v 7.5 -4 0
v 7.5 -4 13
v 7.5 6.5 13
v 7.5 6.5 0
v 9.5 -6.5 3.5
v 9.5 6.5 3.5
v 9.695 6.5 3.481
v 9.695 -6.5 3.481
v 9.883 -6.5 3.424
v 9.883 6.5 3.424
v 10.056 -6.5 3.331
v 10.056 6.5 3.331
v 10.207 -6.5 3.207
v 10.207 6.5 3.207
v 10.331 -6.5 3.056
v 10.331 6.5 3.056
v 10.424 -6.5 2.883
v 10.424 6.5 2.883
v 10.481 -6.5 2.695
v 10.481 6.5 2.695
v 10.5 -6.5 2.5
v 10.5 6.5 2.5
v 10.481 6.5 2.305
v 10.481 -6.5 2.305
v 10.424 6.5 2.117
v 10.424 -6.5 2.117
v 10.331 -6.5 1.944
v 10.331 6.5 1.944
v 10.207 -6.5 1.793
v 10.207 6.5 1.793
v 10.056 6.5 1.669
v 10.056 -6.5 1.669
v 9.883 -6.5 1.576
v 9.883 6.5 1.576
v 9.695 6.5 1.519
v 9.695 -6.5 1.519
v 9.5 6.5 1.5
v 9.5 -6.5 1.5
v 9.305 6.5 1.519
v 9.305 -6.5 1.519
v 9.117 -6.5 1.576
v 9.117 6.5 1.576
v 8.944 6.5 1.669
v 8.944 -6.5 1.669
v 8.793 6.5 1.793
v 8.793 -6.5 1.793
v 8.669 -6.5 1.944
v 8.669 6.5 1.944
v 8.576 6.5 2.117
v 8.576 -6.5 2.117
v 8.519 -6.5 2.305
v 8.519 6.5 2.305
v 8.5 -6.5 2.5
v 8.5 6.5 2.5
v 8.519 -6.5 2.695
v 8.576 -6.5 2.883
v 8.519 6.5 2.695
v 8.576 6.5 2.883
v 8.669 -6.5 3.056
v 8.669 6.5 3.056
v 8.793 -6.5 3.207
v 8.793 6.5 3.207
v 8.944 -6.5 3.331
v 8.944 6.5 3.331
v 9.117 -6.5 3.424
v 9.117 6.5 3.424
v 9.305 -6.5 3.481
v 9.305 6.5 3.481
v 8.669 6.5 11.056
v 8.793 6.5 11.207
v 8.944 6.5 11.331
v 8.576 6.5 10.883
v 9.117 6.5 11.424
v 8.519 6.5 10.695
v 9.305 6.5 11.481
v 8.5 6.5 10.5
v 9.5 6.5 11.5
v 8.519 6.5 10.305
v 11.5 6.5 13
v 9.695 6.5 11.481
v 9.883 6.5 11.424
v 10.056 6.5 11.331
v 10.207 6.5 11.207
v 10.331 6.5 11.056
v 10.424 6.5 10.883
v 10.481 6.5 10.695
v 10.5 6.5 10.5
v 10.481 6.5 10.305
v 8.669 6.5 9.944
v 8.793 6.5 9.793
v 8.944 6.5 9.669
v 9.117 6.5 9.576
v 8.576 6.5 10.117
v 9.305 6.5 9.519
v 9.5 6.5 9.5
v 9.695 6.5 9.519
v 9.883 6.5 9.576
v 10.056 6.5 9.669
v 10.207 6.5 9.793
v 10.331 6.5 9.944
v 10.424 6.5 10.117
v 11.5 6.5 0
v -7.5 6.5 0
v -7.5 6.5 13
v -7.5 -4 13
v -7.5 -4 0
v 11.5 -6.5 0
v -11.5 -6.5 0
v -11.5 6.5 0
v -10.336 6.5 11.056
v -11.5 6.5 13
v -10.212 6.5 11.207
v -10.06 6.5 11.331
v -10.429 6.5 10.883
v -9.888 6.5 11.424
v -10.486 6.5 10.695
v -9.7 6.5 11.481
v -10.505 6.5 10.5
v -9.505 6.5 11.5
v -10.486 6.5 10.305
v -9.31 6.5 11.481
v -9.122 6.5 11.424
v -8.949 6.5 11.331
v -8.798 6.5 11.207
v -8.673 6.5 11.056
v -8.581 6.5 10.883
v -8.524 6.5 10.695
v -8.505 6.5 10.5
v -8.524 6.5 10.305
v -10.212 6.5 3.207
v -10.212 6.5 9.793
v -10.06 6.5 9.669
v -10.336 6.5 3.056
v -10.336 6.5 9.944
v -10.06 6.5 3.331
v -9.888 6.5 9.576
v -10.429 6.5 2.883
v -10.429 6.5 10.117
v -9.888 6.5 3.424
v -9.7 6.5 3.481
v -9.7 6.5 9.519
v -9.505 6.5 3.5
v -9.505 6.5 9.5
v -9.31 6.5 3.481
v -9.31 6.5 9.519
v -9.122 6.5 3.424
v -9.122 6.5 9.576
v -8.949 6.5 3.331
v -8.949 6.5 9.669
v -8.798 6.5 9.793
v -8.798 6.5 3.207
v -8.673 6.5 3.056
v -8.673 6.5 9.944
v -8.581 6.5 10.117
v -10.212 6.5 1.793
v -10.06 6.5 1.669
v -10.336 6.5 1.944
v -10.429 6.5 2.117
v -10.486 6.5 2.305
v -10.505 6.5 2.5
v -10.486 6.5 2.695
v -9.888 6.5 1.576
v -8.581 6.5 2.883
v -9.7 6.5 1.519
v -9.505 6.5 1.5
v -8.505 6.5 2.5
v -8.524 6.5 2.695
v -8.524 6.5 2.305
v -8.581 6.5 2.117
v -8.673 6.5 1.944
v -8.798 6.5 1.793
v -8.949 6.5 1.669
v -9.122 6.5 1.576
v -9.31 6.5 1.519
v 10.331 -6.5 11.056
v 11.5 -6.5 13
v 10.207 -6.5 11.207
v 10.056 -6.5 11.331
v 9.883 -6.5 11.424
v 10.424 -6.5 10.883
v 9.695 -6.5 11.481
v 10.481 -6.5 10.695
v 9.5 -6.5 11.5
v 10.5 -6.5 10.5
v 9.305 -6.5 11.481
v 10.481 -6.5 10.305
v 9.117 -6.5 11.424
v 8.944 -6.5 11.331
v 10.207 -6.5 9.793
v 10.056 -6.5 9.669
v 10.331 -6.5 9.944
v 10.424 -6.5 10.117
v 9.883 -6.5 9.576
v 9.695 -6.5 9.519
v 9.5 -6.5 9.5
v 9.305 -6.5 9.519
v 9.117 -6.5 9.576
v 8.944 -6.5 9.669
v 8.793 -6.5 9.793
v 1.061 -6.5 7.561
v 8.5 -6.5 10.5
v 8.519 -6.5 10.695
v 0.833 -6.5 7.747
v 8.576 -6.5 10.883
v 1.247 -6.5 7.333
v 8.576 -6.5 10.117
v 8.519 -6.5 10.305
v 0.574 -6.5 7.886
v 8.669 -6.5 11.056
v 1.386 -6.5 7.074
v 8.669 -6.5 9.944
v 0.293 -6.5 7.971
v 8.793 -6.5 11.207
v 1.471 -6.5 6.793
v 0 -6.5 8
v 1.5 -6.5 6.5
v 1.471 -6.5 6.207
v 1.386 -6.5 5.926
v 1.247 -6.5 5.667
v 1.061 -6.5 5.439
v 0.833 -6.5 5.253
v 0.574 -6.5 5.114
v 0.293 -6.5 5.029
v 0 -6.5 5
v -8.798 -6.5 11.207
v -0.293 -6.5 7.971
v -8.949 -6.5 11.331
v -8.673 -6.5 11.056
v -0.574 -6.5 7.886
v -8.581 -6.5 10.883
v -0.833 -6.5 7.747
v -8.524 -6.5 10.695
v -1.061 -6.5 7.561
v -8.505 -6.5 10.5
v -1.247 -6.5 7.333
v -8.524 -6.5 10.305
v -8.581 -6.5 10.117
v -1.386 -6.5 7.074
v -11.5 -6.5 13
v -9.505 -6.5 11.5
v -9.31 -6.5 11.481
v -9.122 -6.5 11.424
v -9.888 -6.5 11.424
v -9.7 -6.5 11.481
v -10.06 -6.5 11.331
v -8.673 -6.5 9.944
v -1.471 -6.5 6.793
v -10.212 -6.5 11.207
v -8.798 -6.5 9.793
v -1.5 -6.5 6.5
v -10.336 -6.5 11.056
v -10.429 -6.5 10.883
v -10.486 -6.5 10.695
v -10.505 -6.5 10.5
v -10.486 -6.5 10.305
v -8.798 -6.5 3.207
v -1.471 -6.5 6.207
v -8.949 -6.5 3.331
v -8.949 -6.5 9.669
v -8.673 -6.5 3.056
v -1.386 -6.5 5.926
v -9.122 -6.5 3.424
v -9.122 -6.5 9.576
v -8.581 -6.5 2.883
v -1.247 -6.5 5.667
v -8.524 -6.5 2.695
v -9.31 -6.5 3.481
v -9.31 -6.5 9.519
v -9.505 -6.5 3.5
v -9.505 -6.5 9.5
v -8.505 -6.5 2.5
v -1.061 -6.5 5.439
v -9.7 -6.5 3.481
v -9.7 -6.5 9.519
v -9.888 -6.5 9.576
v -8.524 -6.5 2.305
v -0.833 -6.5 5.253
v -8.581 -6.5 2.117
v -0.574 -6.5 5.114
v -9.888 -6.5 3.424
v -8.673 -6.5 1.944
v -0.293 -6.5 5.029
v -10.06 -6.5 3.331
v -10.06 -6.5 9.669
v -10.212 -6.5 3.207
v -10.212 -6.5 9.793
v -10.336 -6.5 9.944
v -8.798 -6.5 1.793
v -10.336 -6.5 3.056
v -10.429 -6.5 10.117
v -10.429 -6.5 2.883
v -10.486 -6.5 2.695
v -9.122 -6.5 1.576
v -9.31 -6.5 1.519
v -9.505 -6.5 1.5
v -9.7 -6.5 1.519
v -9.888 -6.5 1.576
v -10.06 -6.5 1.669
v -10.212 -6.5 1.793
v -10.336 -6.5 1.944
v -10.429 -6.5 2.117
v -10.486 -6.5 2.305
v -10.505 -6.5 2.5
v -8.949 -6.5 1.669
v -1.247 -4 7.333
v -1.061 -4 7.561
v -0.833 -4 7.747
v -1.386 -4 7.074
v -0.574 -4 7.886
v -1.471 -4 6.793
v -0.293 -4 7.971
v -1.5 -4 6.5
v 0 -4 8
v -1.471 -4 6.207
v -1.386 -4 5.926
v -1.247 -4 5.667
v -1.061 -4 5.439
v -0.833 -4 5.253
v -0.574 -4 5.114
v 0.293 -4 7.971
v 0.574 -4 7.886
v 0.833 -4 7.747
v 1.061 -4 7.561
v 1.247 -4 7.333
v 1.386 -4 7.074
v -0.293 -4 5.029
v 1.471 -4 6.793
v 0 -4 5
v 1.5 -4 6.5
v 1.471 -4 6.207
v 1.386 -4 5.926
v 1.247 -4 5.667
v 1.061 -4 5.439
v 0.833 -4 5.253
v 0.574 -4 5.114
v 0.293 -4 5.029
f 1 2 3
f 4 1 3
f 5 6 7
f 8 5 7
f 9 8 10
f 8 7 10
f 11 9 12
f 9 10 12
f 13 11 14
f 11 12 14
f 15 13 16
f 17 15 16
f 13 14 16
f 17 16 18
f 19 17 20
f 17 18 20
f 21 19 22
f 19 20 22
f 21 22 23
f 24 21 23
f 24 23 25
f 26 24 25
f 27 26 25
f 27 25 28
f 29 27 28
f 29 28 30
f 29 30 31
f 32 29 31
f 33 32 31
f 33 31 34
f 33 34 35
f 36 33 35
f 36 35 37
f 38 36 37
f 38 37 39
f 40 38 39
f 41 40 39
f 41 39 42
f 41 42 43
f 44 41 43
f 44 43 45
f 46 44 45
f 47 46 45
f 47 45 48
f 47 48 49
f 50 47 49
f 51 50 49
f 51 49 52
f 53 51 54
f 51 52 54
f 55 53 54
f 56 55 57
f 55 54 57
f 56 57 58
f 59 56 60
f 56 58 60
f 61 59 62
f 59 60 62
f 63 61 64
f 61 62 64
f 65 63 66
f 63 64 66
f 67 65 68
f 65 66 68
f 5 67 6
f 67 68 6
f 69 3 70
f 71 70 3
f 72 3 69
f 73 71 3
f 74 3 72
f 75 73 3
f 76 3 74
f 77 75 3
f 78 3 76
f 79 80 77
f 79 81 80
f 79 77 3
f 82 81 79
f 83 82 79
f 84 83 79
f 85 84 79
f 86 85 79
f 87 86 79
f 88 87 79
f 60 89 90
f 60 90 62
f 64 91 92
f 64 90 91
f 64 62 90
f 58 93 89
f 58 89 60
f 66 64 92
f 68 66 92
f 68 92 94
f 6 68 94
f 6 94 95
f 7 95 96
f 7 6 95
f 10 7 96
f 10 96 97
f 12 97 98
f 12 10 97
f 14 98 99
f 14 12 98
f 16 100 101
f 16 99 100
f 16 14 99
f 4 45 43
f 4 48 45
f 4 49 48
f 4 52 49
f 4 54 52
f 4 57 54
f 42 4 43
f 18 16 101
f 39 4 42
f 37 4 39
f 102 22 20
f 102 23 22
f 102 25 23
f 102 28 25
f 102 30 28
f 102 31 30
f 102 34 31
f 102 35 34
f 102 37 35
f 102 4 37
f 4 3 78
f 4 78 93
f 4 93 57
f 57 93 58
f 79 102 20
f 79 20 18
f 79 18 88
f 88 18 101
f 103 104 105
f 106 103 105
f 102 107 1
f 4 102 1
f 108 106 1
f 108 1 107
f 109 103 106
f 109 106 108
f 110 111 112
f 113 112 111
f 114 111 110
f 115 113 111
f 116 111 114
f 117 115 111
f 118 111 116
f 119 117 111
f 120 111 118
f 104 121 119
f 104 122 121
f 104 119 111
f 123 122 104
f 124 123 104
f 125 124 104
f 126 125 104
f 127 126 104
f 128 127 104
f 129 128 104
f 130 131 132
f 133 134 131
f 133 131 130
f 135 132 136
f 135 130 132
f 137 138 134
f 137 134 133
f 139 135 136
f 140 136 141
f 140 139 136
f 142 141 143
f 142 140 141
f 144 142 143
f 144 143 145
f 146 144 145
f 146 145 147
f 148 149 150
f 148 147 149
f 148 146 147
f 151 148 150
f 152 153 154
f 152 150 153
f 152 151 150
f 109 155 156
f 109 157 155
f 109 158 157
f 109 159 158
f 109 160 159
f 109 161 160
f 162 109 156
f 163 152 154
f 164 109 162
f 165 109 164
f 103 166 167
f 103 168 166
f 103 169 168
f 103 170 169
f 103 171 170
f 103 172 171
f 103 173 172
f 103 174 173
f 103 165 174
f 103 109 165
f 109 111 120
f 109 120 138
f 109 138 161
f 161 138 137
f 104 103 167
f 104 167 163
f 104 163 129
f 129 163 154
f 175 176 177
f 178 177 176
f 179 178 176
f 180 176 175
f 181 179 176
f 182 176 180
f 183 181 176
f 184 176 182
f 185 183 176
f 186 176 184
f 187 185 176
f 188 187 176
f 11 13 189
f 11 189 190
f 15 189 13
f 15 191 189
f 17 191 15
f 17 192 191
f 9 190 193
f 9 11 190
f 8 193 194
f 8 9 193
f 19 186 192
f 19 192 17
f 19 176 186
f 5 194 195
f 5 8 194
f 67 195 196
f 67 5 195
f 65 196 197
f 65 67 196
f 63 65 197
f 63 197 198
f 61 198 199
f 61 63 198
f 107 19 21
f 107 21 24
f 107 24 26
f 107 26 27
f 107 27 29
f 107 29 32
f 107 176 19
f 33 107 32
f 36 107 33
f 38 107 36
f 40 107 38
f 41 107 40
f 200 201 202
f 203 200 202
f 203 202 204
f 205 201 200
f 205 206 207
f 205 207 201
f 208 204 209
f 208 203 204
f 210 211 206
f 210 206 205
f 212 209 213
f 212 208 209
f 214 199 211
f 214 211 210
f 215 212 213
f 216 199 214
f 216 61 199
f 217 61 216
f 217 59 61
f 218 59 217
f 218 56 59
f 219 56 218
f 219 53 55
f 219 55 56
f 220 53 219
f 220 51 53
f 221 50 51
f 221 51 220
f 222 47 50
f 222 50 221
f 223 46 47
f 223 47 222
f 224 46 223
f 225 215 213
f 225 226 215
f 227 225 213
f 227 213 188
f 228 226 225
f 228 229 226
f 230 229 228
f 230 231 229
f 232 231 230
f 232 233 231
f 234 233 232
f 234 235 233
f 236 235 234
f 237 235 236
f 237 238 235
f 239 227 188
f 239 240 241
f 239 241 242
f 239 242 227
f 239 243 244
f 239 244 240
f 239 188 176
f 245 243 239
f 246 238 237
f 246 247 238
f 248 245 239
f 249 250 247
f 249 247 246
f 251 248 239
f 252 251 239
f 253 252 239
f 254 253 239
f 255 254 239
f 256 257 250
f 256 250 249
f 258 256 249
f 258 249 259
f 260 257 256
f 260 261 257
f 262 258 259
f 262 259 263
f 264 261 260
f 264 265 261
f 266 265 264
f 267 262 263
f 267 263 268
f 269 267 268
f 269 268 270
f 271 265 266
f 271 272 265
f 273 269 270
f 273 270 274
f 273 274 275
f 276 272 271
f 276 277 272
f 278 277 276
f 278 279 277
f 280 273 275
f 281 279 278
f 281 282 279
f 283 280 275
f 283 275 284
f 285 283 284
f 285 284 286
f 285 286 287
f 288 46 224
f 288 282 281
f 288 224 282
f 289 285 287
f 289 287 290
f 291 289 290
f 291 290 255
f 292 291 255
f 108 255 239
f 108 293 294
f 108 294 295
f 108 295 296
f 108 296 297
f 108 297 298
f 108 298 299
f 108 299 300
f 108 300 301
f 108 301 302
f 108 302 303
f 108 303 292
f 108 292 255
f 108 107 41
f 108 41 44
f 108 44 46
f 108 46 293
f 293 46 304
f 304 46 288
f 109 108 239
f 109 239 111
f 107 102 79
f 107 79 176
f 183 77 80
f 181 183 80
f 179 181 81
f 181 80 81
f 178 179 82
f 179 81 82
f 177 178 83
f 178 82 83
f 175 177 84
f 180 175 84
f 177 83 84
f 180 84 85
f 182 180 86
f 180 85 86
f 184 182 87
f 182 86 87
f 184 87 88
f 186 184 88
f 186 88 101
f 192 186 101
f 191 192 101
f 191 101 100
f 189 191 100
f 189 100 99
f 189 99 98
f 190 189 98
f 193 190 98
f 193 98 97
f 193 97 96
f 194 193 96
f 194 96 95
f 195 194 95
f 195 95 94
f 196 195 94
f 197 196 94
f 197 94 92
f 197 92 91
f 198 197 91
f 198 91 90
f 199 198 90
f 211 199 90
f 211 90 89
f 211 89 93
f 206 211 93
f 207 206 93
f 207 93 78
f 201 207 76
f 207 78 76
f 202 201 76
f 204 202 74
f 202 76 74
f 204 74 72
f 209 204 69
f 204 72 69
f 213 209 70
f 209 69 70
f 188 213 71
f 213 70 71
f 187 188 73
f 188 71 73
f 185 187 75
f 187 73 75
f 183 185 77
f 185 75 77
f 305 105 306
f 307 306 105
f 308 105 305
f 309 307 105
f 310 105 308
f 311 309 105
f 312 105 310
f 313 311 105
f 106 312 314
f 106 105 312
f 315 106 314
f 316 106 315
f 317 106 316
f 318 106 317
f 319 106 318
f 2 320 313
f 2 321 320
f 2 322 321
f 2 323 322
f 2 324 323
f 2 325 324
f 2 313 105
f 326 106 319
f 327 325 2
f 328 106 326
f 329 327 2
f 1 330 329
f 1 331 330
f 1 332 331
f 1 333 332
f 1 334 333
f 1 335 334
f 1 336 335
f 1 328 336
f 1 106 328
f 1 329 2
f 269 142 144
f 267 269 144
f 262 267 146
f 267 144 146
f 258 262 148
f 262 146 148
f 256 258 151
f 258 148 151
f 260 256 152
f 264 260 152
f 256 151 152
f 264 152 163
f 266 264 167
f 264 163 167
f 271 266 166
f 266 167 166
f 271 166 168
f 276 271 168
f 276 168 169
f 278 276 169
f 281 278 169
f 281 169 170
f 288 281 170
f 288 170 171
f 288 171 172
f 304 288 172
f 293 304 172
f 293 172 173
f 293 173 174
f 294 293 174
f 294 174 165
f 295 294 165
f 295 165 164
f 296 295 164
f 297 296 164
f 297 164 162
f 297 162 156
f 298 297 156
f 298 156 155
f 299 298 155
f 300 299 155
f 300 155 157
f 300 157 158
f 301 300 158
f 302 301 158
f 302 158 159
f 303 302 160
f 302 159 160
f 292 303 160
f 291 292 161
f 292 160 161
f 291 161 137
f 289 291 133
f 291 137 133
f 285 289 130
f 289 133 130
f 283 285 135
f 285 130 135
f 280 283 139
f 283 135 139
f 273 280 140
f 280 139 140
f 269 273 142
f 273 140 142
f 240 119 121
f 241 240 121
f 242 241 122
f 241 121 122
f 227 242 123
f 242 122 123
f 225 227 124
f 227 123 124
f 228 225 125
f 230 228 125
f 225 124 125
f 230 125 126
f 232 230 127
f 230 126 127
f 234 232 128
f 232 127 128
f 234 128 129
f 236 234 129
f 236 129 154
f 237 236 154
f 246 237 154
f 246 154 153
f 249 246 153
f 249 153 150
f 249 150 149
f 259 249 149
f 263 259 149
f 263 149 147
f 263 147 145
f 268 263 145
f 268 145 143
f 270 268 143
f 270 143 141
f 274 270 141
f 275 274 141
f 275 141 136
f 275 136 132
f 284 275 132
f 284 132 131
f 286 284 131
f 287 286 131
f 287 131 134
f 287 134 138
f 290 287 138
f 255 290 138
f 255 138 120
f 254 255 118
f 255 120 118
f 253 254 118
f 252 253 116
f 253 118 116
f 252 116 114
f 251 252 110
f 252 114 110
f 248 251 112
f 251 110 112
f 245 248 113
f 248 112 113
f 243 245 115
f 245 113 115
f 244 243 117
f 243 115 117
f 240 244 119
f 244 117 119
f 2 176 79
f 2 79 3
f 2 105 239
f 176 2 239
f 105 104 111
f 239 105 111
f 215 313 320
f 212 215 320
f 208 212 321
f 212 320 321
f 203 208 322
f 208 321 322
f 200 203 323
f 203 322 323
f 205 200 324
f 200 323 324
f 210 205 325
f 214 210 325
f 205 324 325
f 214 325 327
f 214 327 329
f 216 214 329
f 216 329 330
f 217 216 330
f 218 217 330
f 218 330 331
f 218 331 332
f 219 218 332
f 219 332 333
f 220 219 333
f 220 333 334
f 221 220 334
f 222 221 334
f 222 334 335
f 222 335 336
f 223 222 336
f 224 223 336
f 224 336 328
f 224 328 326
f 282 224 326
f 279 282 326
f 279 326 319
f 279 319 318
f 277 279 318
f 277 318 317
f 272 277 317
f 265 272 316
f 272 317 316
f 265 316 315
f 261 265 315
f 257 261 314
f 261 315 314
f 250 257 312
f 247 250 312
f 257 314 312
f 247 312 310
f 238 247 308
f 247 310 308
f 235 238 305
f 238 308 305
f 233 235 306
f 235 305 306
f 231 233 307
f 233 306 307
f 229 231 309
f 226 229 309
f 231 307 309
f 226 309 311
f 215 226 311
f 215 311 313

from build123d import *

# Parameters (mm, degrees)
EXTRUDE_1_DEPTH     = 13
SKETCH_2_R          = 1
SKETCH_2_R_2        = 1.5
CUT_EXTRUDE_1_DEPTH = 22.685248442


with BuildPart() as part:
    # 草图1 → 凸台-拉伸1 (new body)
    with BuildSketch(Plane.XY):
        Polygon((-7.5, 6.5), (-7.5, -4), (7.5, -4), (7.5, 6.5), (11.5, 6.5), (11.5, -6.5), (-11.5, -6.5), (-11.5, 6.5), align=None)
    extrude(amount=EXTRUDE_1_DEPTH)

    # 草图2 → 切除-拉伸1 (cut, through all)
    with BuildSketch(Plane(origin=(0, 6.5, 0), x_dir=(1, 0, 0), z_dir=(0, 1, 0))):
        with Locations(Location((-9.504895382, -2.5, 0), (0, 0, 270))):
            Circle(SKETCH_2_R)
        with Locations(Location((-9.504895382, -10.5, 0), (0, 0, 270))):
            Circle(SKETCH_2_R)
        with Locations(Location((9.5, -2.5, 0), (0, 0, 270))):
            Circle(SKETCH_2_R)
        with Locations(Location((9.5, -10.5, 0), (0, 0, 270))):
            Circle(SKETCH_2_R)
        with Locations(Location((0, -6.5, 0), (0, 0, 270))):
            Circle(SKETCH_2_R_2)
    extrude(amount=-CUT_EXTRUDE_1_DEPTH, mode=Mode.SUBTRACT)


solid = part.part
